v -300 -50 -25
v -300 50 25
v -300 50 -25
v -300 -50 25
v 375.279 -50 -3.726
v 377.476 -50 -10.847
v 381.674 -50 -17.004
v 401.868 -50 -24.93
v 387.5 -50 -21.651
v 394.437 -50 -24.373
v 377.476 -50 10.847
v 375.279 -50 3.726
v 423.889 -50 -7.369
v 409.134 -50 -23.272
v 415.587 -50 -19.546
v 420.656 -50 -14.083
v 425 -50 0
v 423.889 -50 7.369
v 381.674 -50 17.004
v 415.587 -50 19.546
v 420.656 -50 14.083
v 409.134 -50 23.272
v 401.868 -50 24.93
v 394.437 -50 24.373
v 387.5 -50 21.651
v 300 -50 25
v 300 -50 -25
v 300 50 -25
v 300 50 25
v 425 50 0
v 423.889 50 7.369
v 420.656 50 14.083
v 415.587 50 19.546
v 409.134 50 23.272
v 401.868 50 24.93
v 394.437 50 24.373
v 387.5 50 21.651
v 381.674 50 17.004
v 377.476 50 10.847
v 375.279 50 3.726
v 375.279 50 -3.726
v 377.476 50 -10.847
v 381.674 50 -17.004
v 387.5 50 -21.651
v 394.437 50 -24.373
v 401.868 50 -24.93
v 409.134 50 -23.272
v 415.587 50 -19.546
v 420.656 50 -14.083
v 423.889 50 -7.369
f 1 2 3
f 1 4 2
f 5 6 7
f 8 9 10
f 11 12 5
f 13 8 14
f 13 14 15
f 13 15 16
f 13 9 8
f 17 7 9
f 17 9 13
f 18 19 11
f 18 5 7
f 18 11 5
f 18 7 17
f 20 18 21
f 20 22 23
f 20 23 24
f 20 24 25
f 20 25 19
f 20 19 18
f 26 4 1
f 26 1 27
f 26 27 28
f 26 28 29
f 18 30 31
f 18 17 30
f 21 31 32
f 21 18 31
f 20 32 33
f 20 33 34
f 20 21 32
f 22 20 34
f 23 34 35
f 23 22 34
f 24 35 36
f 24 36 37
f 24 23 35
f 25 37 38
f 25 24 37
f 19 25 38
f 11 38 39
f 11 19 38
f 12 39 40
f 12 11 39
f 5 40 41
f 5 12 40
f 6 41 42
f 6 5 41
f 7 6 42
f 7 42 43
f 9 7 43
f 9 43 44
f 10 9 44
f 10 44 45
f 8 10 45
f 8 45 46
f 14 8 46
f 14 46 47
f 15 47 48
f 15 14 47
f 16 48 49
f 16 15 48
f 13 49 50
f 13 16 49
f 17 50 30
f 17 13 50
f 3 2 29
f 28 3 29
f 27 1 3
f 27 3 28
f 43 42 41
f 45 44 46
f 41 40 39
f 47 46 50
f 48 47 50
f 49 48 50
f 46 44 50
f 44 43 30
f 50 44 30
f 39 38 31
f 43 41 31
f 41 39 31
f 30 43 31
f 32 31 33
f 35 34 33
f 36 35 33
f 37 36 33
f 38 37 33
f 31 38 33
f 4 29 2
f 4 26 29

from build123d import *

# Parameters (mm, degrees)
F1_DEPTH = 50
F0_R     = 25


# Not quite as in the source:
# - a feature of the source that left no trace in its solid (it failed there, or was rolled back) is left out


with BuildPart() as f1:
    # F0 (on Front) → F1 (new body, symmetric)
    with BuildSketch(Plane.XZ):
        Polygon((-225, 25), (-300, 25), (-300, -25), (300, -25), (300, 25), (-195, 25), align=None)
    extrude(amount=F1_DEPTH, both=True)


with BuildPart() as f1b:
    # F0 (on Front) → F1, piece 2 (new body, symmetric)
    with BuildSketch(Plane.XZ):
        with Locations((400, 0)):
            Circle(F0_R)
    extrude(amount=F1_DEPTH, both=True)


solid = Compound([f1.part, f1b.part])
